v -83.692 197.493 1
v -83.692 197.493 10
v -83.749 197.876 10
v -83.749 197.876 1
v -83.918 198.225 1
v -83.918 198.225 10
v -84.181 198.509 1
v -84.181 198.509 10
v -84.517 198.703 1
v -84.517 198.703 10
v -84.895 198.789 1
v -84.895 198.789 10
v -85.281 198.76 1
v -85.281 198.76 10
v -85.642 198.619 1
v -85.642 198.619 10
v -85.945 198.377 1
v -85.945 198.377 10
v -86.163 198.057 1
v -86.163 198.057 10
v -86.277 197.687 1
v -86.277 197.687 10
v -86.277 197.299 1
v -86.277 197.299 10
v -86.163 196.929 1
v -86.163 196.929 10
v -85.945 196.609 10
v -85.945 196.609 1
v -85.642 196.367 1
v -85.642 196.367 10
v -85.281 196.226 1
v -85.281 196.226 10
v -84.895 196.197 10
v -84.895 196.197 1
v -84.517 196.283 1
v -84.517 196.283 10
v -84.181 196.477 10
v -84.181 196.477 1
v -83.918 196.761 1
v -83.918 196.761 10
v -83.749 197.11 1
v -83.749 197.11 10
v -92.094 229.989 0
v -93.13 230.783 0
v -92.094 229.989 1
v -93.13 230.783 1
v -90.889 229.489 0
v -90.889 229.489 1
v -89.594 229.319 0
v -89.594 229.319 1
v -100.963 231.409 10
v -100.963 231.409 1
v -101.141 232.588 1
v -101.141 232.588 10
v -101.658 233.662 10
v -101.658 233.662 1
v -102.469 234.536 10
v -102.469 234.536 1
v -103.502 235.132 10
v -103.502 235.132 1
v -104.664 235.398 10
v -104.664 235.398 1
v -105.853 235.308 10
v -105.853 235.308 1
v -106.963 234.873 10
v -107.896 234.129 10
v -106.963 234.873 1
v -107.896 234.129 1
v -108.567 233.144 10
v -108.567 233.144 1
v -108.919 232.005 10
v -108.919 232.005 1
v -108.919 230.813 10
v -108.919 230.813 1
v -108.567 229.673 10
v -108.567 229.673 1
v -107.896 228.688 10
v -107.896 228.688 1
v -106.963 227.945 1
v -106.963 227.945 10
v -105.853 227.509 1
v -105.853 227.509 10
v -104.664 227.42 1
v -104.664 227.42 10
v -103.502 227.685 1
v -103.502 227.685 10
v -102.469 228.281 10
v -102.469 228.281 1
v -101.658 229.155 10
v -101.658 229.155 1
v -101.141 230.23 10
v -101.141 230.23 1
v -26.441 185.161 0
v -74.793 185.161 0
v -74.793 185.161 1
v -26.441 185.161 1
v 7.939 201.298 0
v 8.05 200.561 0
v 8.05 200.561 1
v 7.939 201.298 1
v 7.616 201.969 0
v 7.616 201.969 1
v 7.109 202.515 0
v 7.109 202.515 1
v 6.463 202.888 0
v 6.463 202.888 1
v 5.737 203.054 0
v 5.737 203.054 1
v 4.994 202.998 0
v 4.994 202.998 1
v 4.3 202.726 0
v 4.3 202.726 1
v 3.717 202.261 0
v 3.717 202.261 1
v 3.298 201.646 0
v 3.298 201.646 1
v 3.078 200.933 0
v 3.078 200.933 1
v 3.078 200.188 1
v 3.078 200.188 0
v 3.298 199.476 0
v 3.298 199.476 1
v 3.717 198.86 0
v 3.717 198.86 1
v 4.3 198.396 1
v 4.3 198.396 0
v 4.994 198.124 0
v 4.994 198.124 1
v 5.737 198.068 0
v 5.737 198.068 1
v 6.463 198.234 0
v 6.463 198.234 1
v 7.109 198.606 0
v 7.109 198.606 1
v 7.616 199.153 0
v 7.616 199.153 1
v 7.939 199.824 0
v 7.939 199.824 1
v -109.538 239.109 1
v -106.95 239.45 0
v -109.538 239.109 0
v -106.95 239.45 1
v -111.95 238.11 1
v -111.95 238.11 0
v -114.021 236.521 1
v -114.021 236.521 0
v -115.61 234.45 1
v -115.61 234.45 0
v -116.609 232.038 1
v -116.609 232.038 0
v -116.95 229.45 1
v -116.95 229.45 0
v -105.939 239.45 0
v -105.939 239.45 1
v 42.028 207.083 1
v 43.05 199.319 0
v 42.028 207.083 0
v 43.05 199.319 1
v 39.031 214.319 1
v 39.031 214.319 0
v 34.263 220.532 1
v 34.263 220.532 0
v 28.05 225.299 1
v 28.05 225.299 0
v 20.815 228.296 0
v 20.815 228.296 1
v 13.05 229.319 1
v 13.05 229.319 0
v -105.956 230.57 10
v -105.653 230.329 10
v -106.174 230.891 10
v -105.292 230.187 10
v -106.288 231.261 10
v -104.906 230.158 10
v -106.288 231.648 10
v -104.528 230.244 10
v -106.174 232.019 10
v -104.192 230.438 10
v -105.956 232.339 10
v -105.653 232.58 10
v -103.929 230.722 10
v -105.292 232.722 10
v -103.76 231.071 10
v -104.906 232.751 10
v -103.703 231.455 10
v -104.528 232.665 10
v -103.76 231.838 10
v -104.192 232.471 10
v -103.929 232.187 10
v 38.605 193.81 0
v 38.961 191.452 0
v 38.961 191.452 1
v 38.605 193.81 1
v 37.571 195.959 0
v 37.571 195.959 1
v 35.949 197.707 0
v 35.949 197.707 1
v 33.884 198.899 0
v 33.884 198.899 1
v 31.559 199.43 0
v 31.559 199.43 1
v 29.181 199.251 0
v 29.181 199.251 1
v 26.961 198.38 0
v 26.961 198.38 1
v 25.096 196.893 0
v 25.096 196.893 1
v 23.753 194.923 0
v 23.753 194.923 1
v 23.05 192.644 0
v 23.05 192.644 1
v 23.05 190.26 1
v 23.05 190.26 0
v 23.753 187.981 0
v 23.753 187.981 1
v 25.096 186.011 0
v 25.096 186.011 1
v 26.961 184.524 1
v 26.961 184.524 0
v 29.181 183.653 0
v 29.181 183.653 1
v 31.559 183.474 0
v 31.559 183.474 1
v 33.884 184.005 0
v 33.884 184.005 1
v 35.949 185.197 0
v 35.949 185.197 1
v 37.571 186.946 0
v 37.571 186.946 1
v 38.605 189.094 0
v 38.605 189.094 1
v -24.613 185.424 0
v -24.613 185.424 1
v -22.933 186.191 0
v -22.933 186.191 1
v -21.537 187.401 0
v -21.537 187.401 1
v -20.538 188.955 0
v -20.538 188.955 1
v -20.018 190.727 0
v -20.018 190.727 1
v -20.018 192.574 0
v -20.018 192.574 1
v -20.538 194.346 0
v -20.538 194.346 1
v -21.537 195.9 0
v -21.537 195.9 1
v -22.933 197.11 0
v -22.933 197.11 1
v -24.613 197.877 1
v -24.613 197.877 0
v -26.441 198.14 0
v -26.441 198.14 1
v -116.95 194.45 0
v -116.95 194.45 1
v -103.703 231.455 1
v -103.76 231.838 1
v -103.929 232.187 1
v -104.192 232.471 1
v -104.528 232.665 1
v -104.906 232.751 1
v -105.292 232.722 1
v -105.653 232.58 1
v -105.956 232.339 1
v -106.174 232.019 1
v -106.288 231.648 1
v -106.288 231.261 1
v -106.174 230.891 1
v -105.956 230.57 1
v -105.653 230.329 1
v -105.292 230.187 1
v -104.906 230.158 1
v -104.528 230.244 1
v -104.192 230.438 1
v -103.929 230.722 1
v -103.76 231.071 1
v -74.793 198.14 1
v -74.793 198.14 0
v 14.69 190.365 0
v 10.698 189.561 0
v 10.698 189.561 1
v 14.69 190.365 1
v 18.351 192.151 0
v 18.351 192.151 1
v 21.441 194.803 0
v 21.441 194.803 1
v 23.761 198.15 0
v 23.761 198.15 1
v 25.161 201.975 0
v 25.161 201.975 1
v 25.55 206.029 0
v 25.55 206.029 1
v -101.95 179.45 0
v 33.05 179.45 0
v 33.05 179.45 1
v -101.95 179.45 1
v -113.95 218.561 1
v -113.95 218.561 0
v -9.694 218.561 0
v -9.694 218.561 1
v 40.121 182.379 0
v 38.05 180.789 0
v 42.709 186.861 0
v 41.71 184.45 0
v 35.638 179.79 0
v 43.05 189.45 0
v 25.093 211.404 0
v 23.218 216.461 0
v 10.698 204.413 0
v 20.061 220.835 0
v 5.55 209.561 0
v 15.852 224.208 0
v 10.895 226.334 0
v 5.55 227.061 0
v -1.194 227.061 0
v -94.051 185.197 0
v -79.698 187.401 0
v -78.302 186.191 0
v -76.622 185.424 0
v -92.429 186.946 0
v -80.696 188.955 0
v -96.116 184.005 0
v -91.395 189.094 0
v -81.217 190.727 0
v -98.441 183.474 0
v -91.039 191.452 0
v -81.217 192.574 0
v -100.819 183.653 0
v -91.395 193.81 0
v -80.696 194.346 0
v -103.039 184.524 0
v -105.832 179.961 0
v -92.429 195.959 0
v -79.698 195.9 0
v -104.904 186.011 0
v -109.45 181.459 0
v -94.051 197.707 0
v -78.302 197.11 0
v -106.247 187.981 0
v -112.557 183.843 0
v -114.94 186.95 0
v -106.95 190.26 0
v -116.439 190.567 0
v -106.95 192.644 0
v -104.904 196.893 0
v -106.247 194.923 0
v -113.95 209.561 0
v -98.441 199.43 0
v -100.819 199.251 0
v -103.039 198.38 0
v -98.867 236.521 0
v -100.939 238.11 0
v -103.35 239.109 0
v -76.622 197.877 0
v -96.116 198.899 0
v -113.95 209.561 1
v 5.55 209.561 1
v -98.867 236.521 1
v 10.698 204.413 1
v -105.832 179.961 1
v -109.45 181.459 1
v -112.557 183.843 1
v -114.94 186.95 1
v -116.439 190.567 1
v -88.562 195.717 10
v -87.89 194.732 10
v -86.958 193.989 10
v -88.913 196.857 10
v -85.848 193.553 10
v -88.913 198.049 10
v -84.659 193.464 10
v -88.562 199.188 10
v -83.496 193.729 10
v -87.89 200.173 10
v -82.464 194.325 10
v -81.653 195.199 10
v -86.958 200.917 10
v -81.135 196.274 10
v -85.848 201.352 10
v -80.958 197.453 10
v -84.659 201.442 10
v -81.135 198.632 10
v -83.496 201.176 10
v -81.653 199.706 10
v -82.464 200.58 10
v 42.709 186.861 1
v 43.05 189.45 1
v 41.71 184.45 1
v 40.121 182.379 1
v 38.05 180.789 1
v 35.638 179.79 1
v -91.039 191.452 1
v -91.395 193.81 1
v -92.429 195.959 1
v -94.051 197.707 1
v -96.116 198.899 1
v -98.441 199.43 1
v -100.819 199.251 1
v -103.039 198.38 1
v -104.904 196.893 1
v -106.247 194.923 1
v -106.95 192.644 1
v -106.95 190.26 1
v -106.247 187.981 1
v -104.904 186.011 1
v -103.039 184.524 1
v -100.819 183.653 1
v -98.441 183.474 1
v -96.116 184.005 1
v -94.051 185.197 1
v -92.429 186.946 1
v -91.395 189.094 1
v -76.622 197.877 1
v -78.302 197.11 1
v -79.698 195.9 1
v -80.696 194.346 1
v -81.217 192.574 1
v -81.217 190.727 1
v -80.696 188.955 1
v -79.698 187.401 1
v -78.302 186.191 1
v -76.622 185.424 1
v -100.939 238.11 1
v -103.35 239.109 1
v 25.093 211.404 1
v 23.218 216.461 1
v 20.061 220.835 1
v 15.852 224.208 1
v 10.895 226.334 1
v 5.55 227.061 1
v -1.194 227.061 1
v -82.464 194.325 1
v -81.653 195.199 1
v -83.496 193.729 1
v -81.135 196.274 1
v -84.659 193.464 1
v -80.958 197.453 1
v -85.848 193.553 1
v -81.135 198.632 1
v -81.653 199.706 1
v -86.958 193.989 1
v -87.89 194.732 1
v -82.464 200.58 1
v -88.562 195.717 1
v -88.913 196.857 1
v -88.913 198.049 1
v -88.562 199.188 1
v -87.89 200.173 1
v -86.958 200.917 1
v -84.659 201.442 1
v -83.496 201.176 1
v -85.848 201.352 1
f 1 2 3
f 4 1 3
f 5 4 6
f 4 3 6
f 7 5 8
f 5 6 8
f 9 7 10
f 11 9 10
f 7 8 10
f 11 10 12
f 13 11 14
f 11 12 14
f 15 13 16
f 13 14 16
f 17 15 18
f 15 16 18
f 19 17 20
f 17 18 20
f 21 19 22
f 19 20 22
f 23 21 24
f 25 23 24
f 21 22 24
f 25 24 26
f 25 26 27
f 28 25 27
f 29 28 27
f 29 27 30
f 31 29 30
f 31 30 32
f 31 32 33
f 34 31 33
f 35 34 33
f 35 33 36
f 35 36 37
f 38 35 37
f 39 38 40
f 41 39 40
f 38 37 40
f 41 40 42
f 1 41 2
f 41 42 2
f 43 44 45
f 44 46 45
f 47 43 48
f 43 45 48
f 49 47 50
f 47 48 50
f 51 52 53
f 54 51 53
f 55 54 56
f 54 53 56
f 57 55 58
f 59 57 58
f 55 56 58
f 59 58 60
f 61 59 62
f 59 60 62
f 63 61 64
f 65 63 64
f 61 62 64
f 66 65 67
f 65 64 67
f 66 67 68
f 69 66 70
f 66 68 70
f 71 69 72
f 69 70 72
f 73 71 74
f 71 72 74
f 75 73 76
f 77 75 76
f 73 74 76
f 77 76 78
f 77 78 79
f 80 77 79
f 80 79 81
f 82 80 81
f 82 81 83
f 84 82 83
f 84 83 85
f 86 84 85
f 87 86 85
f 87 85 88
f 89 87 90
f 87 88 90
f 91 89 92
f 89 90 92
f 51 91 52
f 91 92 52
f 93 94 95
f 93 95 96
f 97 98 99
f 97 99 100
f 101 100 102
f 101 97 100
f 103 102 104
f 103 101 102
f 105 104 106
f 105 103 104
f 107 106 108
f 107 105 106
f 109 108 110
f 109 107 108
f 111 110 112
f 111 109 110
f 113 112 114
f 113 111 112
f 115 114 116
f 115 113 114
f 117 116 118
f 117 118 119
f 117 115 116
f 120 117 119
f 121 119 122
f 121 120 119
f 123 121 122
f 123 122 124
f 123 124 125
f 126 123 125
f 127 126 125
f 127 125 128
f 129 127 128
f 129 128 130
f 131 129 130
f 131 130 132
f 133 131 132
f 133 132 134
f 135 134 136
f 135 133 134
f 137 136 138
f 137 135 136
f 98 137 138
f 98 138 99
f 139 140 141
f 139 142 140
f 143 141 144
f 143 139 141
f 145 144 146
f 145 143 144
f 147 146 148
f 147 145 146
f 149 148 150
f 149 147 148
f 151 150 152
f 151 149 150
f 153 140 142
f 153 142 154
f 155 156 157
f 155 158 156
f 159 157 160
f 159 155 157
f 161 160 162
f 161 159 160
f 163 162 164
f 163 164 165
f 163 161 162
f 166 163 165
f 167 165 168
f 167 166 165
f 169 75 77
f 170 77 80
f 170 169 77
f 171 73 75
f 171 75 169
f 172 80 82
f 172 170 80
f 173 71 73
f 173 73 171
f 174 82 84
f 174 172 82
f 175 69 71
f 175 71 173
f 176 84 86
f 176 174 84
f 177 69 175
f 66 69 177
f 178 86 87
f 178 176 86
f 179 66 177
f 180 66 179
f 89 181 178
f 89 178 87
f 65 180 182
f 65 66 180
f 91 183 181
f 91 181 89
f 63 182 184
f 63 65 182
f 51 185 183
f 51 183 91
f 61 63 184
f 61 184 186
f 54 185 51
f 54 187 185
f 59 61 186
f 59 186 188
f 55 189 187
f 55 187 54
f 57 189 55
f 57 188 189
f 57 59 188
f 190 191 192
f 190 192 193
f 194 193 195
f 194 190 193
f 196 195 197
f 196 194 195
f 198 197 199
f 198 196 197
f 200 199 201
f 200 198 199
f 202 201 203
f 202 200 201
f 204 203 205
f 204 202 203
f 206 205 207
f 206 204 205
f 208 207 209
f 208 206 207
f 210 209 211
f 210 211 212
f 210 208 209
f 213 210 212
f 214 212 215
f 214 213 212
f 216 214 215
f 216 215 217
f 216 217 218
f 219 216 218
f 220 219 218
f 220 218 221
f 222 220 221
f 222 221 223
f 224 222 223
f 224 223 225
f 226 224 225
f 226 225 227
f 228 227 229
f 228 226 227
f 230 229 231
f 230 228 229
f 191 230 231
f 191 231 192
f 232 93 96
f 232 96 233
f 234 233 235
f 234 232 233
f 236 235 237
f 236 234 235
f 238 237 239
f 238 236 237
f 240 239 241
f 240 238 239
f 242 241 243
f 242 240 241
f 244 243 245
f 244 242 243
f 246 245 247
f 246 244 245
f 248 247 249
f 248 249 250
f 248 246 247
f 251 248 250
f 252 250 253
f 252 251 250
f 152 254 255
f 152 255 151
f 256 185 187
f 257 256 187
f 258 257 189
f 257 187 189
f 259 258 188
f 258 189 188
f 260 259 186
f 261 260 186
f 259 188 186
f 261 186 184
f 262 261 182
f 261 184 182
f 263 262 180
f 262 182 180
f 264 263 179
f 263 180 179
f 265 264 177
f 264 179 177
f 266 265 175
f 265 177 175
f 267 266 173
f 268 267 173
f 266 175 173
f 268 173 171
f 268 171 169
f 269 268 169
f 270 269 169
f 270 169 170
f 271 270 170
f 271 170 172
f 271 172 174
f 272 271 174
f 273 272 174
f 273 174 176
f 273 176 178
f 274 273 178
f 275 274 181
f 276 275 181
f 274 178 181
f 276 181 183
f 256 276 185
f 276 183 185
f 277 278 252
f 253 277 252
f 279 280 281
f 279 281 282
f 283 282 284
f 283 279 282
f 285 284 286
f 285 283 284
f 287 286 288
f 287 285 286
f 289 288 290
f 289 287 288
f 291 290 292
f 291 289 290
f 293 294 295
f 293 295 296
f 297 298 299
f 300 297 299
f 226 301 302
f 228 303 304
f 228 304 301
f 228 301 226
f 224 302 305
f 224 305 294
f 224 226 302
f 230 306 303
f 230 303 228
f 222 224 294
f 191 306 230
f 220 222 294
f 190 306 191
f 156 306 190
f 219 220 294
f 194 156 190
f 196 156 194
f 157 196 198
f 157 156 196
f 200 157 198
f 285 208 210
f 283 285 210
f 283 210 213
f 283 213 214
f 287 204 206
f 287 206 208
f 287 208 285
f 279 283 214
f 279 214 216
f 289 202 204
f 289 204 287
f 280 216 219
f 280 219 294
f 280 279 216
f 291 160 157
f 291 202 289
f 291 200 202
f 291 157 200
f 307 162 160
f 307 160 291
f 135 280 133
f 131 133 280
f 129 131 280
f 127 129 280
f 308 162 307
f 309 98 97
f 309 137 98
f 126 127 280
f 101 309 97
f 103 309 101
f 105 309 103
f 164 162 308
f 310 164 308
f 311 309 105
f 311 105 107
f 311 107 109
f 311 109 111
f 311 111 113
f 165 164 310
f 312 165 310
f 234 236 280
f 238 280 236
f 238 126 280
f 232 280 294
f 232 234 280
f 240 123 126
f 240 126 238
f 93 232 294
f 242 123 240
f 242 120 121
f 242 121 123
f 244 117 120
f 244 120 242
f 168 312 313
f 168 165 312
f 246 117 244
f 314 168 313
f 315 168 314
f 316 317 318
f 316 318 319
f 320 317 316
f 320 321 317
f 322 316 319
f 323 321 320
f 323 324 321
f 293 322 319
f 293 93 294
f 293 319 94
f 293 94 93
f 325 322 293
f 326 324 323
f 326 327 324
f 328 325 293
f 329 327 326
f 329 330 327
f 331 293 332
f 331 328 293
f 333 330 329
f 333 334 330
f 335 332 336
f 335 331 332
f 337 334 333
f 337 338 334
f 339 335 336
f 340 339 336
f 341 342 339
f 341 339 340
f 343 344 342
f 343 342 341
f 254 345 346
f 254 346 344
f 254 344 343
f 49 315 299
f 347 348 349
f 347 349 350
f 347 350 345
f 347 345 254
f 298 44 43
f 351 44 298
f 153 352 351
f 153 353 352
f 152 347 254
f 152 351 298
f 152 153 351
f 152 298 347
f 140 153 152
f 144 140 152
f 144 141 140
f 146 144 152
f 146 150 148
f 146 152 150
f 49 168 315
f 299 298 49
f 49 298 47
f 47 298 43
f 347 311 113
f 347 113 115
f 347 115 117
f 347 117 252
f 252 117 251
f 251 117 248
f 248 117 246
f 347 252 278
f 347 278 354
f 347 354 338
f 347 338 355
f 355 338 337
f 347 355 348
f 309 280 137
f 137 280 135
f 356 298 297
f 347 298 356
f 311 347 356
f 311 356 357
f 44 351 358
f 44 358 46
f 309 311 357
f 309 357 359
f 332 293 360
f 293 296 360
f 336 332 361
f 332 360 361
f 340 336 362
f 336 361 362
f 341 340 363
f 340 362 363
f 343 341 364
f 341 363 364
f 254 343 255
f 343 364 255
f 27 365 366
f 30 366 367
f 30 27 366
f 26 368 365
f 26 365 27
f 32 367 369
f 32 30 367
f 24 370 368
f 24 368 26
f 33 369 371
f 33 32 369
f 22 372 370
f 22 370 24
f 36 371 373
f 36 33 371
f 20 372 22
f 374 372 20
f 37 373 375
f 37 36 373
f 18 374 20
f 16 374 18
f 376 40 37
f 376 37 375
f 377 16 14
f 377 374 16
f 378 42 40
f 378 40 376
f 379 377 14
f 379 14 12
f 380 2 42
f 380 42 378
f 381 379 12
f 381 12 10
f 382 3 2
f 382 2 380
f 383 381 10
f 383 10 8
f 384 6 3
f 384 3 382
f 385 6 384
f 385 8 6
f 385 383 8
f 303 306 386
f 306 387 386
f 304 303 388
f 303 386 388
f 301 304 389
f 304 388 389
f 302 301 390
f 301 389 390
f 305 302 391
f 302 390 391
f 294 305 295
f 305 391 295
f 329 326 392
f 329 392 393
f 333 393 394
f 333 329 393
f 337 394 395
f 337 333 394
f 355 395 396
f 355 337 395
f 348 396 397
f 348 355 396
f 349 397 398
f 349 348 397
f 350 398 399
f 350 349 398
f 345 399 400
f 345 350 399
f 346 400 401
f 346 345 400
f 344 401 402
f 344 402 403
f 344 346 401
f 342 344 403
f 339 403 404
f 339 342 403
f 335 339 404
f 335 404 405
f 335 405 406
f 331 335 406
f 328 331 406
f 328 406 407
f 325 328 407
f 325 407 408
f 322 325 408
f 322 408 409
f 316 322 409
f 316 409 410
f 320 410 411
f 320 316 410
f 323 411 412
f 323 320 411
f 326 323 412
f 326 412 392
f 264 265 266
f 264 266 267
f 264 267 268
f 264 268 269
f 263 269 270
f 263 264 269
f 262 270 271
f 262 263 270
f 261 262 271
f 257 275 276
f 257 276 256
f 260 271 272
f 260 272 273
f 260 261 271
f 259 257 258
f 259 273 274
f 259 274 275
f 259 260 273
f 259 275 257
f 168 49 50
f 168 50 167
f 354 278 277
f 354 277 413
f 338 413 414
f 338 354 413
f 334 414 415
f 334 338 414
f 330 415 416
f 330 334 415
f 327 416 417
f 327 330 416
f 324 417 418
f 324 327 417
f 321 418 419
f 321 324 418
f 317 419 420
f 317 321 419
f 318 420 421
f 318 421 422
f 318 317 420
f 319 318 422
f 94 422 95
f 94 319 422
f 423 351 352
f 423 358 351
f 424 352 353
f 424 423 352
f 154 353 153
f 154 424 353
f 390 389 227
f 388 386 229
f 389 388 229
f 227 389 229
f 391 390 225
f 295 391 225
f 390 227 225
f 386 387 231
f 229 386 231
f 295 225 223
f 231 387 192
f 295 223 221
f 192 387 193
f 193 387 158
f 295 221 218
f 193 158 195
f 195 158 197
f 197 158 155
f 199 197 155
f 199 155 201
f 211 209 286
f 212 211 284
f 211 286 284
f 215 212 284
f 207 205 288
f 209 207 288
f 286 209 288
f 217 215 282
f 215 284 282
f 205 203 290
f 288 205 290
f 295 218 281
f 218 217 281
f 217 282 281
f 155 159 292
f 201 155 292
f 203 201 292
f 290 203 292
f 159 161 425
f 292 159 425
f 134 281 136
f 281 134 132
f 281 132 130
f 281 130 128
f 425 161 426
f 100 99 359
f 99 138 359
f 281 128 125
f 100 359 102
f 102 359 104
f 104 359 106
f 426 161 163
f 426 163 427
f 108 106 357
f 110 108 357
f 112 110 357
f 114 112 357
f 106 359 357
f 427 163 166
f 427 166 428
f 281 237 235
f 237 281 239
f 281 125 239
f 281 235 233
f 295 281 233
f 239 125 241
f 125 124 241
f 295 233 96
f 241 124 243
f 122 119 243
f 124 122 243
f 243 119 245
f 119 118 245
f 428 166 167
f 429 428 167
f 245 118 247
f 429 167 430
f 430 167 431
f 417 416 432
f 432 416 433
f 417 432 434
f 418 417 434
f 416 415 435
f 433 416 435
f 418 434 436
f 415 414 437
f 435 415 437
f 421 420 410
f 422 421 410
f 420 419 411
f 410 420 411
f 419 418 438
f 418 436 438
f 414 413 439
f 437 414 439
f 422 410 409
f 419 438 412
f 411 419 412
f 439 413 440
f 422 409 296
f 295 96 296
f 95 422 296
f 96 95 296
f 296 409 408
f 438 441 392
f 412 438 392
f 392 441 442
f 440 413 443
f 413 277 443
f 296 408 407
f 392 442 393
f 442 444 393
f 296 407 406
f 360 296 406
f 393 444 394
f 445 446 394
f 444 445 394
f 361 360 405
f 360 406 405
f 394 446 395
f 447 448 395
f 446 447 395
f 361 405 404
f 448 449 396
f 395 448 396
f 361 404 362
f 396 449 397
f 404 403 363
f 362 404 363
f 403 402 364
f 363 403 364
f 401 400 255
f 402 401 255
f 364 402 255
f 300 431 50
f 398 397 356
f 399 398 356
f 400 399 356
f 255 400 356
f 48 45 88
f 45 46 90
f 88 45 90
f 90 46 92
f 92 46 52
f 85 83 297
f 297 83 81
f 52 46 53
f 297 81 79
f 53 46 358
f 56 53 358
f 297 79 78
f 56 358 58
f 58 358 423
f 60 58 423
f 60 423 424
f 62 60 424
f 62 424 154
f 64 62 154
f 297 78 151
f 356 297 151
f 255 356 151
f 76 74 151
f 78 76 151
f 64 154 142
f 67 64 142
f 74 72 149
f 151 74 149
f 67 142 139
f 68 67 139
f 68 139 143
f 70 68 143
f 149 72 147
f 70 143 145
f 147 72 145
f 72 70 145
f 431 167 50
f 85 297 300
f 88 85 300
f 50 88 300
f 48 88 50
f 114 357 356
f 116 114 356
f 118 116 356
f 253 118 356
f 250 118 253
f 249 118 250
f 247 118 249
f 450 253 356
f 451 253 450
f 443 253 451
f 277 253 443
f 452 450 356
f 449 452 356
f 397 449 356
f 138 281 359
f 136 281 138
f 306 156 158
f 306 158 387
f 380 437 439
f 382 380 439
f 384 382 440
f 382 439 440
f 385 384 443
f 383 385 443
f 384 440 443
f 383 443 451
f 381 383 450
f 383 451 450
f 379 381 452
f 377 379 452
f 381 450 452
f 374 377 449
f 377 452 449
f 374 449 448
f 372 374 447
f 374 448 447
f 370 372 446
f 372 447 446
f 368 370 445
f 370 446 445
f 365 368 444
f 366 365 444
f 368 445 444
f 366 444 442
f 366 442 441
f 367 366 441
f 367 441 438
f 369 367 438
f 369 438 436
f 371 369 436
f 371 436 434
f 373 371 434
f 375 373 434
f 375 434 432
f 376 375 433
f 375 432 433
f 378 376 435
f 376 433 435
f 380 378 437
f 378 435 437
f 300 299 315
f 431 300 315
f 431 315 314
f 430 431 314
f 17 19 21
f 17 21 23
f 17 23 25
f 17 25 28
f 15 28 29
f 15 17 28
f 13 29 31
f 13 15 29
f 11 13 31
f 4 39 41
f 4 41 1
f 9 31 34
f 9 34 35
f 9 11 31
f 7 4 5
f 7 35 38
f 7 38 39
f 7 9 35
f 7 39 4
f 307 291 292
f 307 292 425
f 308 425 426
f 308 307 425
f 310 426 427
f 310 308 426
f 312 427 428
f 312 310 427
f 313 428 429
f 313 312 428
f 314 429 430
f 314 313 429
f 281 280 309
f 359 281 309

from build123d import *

# Parameters (mm, degrees)
SKETCH001_R   = 2.5
SKETCH001_R_2 = 8
PAD_DEPTH     = 1
SKETCH003_R   = 4
PAD001_DEPTH  = 9
SKETCH004_R   = 1.3
POCKET_DEPTH  = 9
FILLET_R      = 10
FILLET001_R   = 15
FILLET002_R   = 30
FILLET003_R   = 10
FILLET004_R   = 10
FILLET005_R   = 5


with BuildPart() as part:
    # Sketch001 → Pad (new body)
    with BuildSketch(Plane.XY):
        Polygon((43.04995, 229.318703), (43.04995, 179.449575), (-116.95005, 179.449575), (-116.95005, 239.449575), (-101.796377, 239.449575), (-91.665504, 229.318703), align=None)
        with Locations((5.54995, 200.560838)):
            Circle(SKETCH001_R, mode=Mode.SUBTRACT)
        with Locations((-99.039165, 191.452072)):
            Circle(SKETCH001_R_2, mode=Mode.SUBTRACT)
        with Locations((30.960835, 191.452072)):
            Circle(SKETCH001_R_2, mode=Mode.SUBTRACT)
        with BuildLine():
            ThreePointArc((25.54995, 206.028969), (20.061493, 220.835101), (5.54995, 227.060838))
            Line((-1.19441, 227.060838), (5.54995, 227.060838))
            Line((-9.694456, 218.560838), (-1.19441, 227.060838))
            Line((-113.95005, 218.561117), (-9.694456, 218.560838))
            Line((-113.95005, 218.561117), (-113.95005, 209.560838))
            Line((-113.95005, 209.560838), (-9.618024, 209.560838))
            Line((-9.618024, 209.560838), (5.54995, 209.560838))
            Line((5.54995, 209.560838), (10.697892, 204.412896))
            Line((10.697892, 189.560838), (10.697892, 204.412896))
            ThreePointArc((10.697892, 189.560838), (21.441031, 194.803313), (25.54995, 206.028969))
        make_face(mode=Mode.SUBTRACT)
        with BuildLine():
            ThreePointArc((-74.793427, 198.14003), (-81.282837, 191.65062), (-74.793427, 185.16121))
            Line((-74.793427, 185.16121), (-26.440948, 185.16121))
            ThreePointArc((-26.440948, 185.16121), (-19.951538, 191.65062), (-26.440948, 198.14003))
            Line((-74.793427, 198.14003), (-26.440948, 198.14003))
        make_face(mode=Mode.SUBTRACT)
    extrude(amount=PAD_DEPTH)

    # Sketch003 (on Face25 of Pad) → Pad001 (join)
    with BuildSketch(Plane.XY.offset(1)):
        with Locations((-104.963402, 231.408722)):
            Circle(SKETCH003_R)
        with Locations((-84.957718, 197.452713)):
            Circle(SKETCH003_R)
    extrude(amount=PAD001_DEPTH)

    # Sketch004 (on Face29 of Pad001) → Pocket (cut)
    with BuildSketch(Plane.XY.offset(10)):
        with Locations((-105.002731, 231.45459)):
            Circle(SKETCH004_R)
        with Locations((-84.991737, 197.493057)):
            Circle(SKETCH004_R)
    extrude(amount=-POCKET_DEPTH, mode=Mode.SUBTRACT)

    # Fillet
    fillet_edges = [part.edges().sort_by_distance(p)[0] for p in [
        (43.04995, 179.449575, 0.5),
    ]]
    fillet(fillet_edges, radius=FILLET_R)

    # Fillet001
    fillet001_edges = [part.edges().sort_by_distance(p)[0] for p in [
        (-116.95005, 179.449575, 0.5),
    ]]
    fillet(fillet001_edges, radius=FILLET001_R)

    # Fillet002
    fillet002_edges = [part.edges().sort_by_distance(p)[0] for p in [
        (43.04995, 229.318703, 0.5),
    ]]
    fillet(fillet002_edges, radius=FILLET002_R)

    # Fillet003
    fillet003_edges = [part.edges().sort_by_distance(p)[0] for p in [
        (-101.796377, 239.449575, 0.5),
    ]]
    fillet(fillet003_edges, radius=FILLET003_R)

    # Fillet004
    fillet004_edges = [part.edges().sort_by_distance(p)[0] for p in [
        (-116.95005, 239.449575, 0.5),
    ]]
    fillet(fillet004_edges, radius=FILLET004_R)

    # Fillet005
    fillet005_edges = [part.edges().sort_by_distance(p)[0] for p in [
        (-91.665504, 229.318703, 0.5),
    ]]
    fillet(fillet005_edges, radius=FILLET005_R)


solid = part.part
